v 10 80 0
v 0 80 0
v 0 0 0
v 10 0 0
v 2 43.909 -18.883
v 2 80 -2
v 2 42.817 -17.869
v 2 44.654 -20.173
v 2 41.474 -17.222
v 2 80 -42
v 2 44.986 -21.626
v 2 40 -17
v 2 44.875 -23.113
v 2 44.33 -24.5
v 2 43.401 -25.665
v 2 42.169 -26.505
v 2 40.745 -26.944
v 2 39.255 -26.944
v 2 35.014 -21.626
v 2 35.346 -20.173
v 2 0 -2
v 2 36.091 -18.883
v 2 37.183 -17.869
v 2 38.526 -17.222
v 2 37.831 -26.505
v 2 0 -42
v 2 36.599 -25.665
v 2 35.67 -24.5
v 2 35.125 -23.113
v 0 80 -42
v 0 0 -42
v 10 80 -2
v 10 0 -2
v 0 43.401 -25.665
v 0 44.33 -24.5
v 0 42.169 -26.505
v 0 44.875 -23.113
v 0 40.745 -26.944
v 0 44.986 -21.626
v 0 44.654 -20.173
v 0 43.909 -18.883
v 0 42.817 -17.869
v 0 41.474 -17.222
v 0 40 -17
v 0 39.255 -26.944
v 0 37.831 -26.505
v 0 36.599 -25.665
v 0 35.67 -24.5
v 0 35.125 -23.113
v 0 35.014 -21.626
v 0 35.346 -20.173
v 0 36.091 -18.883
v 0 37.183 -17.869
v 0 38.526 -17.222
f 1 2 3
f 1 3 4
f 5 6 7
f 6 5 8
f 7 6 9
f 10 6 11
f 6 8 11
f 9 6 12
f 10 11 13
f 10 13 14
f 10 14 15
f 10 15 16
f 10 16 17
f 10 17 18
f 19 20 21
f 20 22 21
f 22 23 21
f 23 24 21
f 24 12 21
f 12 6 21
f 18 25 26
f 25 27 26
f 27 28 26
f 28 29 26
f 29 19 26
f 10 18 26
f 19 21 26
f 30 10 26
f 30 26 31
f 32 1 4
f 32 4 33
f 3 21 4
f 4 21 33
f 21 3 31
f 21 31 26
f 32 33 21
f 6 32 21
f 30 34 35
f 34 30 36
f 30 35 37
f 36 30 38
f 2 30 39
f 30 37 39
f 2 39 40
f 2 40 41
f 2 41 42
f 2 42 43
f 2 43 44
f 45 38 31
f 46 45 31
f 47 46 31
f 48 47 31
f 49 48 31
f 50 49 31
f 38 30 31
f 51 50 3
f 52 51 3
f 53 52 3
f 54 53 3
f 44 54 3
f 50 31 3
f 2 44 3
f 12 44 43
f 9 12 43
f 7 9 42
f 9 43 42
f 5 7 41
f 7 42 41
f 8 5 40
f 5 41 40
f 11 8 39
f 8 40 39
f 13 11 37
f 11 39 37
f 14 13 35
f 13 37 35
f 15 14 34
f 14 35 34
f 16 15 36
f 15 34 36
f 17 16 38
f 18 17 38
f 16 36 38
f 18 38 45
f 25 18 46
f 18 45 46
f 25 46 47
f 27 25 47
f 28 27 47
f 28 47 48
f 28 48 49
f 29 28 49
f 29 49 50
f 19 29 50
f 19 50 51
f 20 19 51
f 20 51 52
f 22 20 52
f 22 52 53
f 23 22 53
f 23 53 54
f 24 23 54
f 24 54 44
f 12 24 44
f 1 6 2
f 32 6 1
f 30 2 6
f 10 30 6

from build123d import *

# Parameters (mm, degrees)
EXTRUDE_1_DEPTH     = 80
SKETCH_3_R          = 5
CUT_EXTRUDE_1_DEPTH = 10


with BuildPart() as part:
    # Эскиз2 → Вытянуть-Тонкостенный1 (new body)
    with BuildSketch(Plane(origin=(0, 0, 0), x_dir=(1, 0, 0), z_dir=(0, 1, 0))):
        Polygon((0, 42), (0, 0), (10, 0), (10, 2), (2, 2), (2, 42), align=None)
    extrude(amount=EXTRUDE_1_DEPTH)

    # Эскиз3 → Вырез-Вытянуть1 (cut)
    with BuildSketch(Plane.ZY):
        with Locations((-22, 40)):
            Circle(SKETCH_3_R)
    extrude(amount=-CUT_EXTRUDE_1_DEPTH, mode=Mode.SUBTRACT)


solid = part.part
